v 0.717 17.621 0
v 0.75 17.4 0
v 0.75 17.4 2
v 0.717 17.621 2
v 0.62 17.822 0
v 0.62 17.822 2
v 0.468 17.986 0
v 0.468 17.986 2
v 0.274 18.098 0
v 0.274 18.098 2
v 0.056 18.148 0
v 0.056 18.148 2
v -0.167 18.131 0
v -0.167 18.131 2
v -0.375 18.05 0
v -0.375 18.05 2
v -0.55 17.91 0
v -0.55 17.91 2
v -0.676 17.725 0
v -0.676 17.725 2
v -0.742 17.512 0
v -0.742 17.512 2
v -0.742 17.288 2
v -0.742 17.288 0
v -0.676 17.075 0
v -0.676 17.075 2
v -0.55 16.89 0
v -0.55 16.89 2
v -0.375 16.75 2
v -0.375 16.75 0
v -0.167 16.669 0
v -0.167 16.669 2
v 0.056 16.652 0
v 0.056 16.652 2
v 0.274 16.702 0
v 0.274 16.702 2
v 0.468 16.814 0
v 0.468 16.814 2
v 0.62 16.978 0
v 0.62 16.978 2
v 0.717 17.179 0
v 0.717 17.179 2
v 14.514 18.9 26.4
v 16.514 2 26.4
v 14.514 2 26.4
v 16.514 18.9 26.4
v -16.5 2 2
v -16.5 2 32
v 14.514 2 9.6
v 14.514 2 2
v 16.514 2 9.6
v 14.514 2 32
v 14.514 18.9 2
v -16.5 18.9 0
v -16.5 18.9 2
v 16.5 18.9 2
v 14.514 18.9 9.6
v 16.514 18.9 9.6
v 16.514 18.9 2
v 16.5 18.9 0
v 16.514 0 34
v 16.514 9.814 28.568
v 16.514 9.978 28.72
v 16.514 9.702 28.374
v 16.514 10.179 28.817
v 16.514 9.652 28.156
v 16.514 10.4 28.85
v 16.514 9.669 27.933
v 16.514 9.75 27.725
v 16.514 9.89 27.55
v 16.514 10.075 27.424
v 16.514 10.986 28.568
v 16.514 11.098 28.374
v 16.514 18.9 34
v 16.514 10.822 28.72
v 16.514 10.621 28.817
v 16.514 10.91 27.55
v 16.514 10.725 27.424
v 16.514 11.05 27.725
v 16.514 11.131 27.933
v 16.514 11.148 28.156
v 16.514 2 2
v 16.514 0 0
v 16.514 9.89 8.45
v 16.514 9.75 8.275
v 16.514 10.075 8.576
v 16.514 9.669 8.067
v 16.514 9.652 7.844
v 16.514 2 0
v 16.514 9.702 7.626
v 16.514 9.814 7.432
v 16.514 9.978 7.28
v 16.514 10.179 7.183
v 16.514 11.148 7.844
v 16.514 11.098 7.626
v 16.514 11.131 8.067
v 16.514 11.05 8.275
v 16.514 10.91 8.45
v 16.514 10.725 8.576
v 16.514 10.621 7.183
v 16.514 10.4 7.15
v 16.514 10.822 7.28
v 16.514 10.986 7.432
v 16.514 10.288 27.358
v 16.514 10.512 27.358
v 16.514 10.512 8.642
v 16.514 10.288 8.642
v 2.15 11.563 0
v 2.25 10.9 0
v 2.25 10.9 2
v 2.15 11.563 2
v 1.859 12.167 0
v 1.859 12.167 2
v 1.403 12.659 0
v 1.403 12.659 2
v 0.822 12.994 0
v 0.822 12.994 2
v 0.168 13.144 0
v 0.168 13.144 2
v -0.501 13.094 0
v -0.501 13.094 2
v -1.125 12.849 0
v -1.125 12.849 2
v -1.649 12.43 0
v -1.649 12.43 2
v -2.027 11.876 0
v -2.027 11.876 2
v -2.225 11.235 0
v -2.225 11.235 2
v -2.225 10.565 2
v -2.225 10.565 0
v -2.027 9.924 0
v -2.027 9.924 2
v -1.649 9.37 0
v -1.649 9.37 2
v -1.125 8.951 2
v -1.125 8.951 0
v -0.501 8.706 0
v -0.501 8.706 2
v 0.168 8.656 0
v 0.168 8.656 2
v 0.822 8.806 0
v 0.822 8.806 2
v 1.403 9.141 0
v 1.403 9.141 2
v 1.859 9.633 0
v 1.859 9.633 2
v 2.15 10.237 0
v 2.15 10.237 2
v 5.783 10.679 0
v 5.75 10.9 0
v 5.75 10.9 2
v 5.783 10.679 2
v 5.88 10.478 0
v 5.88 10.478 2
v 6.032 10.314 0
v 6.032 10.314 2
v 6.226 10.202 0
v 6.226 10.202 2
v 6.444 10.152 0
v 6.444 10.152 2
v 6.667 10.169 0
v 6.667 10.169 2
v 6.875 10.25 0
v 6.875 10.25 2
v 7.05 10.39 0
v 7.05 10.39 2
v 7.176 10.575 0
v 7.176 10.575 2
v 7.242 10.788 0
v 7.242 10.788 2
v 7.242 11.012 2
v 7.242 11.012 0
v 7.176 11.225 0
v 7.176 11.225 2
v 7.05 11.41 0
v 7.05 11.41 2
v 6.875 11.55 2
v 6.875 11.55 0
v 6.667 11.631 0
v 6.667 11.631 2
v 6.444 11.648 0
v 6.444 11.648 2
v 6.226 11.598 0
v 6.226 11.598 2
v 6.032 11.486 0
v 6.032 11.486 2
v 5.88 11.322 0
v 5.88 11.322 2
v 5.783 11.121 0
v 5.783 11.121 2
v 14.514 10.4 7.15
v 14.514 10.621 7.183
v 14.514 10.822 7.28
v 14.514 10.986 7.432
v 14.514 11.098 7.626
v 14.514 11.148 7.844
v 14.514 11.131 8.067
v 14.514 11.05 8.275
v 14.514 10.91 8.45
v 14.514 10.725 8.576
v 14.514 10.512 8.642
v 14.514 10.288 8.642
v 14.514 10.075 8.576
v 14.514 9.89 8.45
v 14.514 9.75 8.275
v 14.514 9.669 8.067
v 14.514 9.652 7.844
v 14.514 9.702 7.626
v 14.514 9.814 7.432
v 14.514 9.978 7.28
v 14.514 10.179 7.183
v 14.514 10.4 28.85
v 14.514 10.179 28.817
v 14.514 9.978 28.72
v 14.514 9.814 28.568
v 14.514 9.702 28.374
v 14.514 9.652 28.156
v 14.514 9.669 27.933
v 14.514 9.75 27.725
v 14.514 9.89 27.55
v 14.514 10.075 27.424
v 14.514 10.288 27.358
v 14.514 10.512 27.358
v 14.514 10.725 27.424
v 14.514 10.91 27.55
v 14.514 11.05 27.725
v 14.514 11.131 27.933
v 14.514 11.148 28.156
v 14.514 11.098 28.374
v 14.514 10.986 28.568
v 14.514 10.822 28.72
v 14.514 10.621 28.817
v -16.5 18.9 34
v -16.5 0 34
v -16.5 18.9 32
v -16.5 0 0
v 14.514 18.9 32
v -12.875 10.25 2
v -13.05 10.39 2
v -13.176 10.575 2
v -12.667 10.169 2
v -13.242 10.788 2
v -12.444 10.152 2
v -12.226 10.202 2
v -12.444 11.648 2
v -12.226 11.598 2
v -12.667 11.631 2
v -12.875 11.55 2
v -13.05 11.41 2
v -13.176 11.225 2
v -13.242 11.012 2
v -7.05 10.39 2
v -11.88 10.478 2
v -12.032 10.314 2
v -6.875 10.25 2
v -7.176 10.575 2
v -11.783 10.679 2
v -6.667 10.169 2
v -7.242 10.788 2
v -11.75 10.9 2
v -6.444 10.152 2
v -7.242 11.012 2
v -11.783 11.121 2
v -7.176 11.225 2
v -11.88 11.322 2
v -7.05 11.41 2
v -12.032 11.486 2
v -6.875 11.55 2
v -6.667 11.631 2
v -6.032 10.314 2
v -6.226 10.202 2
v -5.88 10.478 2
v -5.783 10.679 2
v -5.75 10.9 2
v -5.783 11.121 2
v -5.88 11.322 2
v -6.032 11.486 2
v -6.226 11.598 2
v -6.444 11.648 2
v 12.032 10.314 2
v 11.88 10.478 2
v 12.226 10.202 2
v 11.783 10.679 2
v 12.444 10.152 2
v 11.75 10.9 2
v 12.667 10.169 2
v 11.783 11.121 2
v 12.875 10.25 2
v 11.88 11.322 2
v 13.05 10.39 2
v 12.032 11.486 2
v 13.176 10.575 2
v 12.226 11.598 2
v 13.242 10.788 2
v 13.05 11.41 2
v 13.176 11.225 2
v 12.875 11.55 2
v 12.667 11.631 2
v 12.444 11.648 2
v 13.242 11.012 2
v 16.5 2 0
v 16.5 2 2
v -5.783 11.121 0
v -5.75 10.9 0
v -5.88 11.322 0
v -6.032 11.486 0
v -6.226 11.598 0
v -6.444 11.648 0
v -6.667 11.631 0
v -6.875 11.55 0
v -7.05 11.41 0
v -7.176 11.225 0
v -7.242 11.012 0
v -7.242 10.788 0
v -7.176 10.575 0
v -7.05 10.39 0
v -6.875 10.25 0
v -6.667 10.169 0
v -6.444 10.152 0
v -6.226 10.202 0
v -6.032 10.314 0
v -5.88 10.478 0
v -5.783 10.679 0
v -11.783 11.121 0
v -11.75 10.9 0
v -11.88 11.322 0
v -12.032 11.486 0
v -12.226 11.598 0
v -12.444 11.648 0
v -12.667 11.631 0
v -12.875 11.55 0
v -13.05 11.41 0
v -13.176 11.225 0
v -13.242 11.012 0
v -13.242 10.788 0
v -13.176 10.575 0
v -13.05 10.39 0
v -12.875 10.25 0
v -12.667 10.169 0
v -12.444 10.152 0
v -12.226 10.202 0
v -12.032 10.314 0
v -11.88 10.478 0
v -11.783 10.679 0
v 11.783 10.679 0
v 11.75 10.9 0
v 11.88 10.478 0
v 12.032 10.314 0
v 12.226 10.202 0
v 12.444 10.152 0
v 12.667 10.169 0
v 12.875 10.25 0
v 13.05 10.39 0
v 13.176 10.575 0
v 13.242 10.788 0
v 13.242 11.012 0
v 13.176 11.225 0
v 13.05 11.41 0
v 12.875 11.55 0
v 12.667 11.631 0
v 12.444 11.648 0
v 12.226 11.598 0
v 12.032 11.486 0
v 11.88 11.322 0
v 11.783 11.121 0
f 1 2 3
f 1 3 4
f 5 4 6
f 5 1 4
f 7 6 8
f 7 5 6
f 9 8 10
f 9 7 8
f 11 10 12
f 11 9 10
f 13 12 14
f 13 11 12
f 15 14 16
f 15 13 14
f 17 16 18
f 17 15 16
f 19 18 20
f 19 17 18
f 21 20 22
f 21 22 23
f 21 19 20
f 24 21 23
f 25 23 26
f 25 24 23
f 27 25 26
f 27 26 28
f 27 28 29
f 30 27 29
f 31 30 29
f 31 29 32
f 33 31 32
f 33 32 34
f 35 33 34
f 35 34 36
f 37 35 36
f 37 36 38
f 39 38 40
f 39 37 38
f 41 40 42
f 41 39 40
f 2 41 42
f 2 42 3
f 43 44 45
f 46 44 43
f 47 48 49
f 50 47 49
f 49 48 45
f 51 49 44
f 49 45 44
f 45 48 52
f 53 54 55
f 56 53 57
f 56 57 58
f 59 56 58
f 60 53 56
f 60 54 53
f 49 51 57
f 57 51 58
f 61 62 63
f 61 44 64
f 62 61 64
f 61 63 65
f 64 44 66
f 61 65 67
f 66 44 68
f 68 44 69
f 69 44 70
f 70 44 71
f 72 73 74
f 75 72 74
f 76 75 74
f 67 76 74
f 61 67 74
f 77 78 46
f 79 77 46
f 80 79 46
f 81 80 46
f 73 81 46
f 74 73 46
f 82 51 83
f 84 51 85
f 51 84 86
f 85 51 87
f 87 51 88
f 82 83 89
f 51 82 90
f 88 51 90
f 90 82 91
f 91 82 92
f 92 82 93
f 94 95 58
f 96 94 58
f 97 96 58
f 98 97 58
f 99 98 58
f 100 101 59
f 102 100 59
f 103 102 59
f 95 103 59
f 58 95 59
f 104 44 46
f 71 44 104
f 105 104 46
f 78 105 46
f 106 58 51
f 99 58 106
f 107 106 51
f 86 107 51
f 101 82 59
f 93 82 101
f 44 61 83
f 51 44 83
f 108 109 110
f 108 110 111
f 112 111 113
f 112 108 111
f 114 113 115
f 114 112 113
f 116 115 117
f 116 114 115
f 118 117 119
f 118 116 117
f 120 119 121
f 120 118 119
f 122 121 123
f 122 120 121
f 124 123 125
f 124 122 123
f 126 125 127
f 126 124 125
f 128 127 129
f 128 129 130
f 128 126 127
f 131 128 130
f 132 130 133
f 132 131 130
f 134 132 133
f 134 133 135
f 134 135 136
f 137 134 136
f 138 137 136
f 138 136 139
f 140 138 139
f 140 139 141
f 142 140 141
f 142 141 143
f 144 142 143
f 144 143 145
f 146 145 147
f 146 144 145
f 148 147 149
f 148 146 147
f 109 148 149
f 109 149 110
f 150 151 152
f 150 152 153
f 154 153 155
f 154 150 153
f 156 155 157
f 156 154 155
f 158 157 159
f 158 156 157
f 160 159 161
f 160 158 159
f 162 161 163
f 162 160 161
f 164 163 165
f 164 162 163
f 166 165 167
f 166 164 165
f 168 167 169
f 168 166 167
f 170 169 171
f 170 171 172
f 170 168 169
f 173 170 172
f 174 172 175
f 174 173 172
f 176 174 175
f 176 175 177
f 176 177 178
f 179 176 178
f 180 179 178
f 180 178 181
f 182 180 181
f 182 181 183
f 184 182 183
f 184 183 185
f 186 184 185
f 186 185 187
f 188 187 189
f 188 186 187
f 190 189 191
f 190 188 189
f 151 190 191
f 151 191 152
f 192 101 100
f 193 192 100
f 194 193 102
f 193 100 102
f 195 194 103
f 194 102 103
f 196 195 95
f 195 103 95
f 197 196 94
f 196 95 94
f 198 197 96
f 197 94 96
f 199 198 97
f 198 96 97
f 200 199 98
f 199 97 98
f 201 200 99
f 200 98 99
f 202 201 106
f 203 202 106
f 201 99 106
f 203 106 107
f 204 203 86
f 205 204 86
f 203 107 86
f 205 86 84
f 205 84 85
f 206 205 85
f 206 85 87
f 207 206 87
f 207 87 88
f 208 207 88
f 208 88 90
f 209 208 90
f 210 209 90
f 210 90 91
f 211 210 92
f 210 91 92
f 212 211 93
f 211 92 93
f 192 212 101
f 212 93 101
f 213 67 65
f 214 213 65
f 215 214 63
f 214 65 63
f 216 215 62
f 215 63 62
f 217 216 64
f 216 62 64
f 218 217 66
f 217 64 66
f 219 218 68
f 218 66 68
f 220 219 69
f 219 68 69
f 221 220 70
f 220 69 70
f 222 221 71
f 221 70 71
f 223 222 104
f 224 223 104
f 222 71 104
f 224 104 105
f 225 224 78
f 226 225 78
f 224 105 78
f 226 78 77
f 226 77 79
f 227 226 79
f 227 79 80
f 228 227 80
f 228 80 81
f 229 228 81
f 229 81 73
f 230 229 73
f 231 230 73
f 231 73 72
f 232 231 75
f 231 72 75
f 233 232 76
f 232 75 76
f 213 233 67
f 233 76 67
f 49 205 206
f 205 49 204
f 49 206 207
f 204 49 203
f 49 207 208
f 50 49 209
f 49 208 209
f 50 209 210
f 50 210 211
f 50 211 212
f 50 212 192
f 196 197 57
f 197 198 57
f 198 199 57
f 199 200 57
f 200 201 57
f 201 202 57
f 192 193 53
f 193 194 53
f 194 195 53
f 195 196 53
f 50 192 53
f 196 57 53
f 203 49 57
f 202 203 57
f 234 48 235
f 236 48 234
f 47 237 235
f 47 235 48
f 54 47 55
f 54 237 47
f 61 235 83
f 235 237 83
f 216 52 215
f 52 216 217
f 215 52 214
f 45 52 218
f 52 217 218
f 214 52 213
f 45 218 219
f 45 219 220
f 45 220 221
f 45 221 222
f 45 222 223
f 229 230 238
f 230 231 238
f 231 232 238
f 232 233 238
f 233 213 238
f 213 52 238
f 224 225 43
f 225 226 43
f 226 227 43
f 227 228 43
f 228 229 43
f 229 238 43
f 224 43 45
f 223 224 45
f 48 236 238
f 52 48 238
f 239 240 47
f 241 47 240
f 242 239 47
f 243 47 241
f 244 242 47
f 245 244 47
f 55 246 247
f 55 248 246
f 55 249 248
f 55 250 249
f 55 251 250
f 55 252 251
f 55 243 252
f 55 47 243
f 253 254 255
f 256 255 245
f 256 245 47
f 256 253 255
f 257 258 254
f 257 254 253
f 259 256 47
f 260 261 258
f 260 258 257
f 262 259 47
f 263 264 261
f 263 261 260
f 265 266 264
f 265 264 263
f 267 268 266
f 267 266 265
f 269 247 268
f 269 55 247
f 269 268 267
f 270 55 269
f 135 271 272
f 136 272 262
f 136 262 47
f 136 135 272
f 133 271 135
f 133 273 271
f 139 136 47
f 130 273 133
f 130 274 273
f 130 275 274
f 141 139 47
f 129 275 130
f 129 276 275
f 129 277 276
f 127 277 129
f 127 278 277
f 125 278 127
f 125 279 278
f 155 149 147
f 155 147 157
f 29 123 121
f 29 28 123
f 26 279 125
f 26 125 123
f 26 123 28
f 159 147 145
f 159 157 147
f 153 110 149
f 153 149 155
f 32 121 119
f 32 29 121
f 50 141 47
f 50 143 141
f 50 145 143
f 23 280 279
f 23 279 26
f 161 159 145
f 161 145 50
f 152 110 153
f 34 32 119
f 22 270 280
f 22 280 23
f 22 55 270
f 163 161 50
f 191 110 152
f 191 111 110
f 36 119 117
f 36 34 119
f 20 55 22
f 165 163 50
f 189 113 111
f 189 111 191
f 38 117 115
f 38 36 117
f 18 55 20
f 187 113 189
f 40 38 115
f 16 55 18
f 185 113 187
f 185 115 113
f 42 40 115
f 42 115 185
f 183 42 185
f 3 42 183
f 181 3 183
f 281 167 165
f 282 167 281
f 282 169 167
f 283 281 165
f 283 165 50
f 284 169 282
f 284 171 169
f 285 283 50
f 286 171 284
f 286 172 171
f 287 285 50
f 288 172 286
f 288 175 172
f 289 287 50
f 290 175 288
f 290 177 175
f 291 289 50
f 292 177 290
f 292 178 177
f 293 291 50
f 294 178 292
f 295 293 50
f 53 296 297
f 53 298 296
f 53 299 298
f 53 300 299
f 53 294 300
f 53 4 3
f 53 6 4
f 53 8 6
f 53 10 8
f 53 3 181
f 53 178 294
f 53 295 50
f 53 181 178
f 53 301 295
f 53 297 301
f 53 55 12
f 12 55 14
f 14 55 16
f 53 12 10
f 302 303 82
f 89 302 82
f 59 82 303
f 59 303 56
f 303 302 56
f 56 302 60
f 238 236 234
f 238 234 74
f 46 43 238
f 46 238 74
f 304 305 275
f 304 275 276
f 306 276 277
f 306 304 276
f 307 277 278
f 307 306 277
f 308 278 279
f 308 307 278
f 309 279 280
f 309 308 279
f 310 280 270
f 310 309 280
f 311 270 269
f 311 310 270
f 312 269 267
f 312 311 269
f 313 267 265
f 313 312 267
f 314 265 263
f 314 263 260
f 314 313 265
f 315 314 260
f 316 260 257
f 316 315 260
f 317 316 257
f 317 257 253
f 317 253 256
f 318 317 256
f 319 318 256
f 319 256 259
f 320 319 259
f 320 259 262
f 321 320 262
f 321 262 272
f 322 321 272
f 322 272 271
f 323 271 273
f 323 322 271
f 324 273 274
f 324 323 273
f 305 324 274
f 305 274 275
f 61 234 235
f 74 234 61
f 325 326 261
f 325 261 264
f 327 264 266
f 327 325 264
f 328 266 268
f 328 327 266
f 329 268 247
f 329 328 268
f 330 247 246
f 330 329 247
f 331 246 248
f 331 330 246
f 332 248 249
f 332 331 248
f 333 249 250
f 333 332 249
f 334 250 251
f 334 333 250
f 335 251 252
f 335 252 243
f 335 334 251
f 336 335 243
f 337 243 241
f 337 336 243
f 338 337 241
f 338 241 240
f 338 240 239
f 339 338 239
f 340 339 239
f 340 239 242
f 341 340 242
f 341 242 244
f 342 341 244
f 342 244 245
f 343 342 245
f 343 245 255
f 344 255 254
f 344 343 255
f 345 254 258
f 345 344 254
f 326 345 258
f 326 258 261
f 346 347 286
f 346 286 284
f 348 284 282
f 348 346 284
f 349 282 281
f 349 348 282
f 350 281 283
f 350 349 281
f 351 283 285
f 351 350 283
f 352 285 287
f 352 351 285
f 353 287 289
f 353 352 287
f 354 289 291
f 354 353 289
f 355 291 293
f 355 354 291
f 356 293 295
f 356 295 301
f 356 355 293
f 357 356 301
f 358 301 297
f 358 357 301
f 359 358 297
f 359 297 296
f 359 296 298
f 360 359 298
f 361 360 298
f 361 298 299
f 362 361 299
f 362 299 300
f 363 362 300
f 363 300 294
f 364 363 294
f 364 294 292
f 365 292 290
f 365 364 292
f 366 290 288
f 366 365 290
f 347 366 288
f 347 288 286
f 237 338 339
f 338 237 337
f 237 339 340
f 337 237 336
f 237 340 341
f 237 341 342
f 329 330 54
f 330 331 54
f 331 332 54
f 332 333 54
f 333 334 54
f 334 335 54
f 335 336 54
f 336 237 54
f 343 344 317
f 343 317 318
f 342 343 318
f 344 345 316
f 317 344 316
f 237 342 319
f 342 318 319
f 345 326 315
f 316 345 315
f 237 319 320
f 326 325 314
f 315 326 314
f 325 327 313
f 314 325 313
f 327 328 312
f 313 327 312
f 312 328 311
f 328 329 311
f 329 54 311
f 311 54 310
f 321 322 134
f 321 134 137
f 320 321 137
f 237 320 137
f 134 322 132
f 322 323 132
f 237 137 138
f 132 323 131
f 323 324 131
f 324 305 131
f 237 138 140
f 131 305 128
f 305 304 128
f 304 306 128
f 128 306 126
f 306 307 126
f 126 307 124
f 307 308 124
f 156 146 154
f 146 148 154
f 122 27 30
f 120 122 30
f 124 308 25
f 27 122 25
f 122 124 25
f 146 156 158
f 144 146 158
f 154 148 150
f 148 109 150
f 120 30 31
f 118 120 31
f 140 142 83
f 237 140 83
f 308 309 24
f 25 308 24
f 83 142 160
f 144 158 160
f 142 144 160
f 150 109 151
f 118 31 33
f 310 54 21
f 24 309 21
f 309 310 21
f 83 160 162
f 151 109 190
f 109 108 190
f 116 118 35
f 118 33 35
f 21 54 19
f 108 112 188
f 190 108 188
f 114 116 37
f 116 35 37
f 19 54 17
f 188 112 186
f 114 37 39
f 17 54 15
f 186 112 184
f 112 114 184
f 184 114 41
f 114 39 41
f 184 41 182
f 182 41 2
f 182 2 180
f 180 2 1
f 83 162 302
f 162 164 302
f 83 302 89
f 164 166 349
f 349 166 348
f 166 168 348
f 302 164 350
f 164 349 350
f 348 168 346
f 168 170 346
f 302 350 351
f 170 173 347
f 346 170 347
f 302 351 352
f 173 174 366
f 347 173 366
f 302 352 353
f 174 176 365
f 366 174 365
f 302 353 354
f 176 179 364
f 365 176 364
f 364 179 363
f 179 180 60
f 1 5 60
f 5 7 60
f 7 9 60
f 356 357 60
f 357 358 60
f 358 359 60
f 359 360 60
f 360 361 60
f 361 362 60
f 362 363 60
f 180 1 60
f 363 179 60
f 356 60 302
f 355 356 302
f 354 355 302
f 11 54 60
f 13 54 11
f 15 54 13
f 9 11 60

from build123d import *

# Parameters (mm, degrees)
SKETCH_1_W      = 33
SKETCH_1_H      = 18.9
SKETCH_1_R      = 2.25
SKETCH_1_R_2    = 0.75
EXTRUDE_1_DEPTH = 2
SKETCH_3_W      = 33.014157098
SKETCH_3_H      = 32
EXTRUDE_2_DEPTH = 2
SKETCH_7_W      = 5.6
SKETCH_7_H      = 16.9
SKETCH_7_R      = 0.75
SKETCH_7_W_2    = 7.6
EXTRUDE_3_DEPTH = 2
SKETCH_8_W      = 33.014157098
SKETCH_8_H      = 18.9
EXTRUDE_4_DEPTH = 2


with BuildPart() as part:
    # 草图1 → 凸台-拉伸1 (new body)
    with BuildSketch(Plane.XY):
        with Locations((0, 9.45)):
            Rectangle(SKETCH_1_W, SKETCH_1_H)
        with Locations((0, 10.9)):
            Circle(SKETCH_1_R, mode=Mode.SUBTRACT)
        with Locations((0, 17.4)):
            Circle(SKETCH_1_R_2, mode=Mode.SUBTRACT)
        with Locations((-6.5, 10.9)):
            Circle(SKETCH_1_R_2, mode=Mode.SUBTRACT)
        with Locations((-12.5, 10.9)):
            Circle(SKETCH_1_R_2, mode=Mode.SUBTRACT)
        with Locations(Location((6.5, 10.9, 0), (0, 0, 180))):
            Circle(SKETCH_1_R_2, mode=Mode.SUBTRACT)
        with Locations(Location((12.5, 10.9, 0), (0, 0, 180))):
            Circle(SKETCH_1_R_2, mode=Mode.SUBTRACT)
    extrude(amount=EXTRUDE_1_DEPTH)

    # 草图3 → 凸台-拉伸2 (add)
    with BuildSketch(Plane.XZ):
        with Locations((0.007078549, 16)):
            Rectangle(SKETCH_3_W, SKETCH_3_H)
    extrude(amount=-EXTRUDE_2_DEPTH)

    # 草图7 → 凸台-拉伸3 (add)
    # profile 1 of 2: a face of its own
    with BuildSketch(Plane(origin=(16.514157098, 0, 0), x_dir=(0, 0, -1), z_dir=(1, 0, 0))):
        with Locations((-29.2, 10.45)):
            Rectangle(SKETCH_7_W, SKETCH_7_H)
        with Locations(Location((-28.1, 10.4, 0), (0, 0, 180))):
            Circle(SKETCH_7_R, mode=Mode.SUBTRACT)
    # profile 2 of 2: a face of its own
    with BuildSketch(Plane(origin=(16.514157098, 0, 0), x_dir=(0, 0, -1), z_dir=(1, 0, 0))):
        with Locations((-5.8, 10.45)):
            Rectangle(SKETCH_7_W_2, SKETCH_7_H)
        with Locations((-7.9, 10.4)):
            Circle(SKETCH_7_R, mode=Mode.SUBTRACT)
    extrude(amount=-EXTRUDE_3_DEPTH)

    # 草图8 → 凸台-拉伸4 (add)
    with BuildSketch(Plane.XY.offset(32)):
        with Locations((0.007078549, 9.45)):
            Rectangle(SKETCH_8_W, SKETCH_8_H)
    extrude(amount=EXTRUDE_4_DEPTH)


solid = part.part
